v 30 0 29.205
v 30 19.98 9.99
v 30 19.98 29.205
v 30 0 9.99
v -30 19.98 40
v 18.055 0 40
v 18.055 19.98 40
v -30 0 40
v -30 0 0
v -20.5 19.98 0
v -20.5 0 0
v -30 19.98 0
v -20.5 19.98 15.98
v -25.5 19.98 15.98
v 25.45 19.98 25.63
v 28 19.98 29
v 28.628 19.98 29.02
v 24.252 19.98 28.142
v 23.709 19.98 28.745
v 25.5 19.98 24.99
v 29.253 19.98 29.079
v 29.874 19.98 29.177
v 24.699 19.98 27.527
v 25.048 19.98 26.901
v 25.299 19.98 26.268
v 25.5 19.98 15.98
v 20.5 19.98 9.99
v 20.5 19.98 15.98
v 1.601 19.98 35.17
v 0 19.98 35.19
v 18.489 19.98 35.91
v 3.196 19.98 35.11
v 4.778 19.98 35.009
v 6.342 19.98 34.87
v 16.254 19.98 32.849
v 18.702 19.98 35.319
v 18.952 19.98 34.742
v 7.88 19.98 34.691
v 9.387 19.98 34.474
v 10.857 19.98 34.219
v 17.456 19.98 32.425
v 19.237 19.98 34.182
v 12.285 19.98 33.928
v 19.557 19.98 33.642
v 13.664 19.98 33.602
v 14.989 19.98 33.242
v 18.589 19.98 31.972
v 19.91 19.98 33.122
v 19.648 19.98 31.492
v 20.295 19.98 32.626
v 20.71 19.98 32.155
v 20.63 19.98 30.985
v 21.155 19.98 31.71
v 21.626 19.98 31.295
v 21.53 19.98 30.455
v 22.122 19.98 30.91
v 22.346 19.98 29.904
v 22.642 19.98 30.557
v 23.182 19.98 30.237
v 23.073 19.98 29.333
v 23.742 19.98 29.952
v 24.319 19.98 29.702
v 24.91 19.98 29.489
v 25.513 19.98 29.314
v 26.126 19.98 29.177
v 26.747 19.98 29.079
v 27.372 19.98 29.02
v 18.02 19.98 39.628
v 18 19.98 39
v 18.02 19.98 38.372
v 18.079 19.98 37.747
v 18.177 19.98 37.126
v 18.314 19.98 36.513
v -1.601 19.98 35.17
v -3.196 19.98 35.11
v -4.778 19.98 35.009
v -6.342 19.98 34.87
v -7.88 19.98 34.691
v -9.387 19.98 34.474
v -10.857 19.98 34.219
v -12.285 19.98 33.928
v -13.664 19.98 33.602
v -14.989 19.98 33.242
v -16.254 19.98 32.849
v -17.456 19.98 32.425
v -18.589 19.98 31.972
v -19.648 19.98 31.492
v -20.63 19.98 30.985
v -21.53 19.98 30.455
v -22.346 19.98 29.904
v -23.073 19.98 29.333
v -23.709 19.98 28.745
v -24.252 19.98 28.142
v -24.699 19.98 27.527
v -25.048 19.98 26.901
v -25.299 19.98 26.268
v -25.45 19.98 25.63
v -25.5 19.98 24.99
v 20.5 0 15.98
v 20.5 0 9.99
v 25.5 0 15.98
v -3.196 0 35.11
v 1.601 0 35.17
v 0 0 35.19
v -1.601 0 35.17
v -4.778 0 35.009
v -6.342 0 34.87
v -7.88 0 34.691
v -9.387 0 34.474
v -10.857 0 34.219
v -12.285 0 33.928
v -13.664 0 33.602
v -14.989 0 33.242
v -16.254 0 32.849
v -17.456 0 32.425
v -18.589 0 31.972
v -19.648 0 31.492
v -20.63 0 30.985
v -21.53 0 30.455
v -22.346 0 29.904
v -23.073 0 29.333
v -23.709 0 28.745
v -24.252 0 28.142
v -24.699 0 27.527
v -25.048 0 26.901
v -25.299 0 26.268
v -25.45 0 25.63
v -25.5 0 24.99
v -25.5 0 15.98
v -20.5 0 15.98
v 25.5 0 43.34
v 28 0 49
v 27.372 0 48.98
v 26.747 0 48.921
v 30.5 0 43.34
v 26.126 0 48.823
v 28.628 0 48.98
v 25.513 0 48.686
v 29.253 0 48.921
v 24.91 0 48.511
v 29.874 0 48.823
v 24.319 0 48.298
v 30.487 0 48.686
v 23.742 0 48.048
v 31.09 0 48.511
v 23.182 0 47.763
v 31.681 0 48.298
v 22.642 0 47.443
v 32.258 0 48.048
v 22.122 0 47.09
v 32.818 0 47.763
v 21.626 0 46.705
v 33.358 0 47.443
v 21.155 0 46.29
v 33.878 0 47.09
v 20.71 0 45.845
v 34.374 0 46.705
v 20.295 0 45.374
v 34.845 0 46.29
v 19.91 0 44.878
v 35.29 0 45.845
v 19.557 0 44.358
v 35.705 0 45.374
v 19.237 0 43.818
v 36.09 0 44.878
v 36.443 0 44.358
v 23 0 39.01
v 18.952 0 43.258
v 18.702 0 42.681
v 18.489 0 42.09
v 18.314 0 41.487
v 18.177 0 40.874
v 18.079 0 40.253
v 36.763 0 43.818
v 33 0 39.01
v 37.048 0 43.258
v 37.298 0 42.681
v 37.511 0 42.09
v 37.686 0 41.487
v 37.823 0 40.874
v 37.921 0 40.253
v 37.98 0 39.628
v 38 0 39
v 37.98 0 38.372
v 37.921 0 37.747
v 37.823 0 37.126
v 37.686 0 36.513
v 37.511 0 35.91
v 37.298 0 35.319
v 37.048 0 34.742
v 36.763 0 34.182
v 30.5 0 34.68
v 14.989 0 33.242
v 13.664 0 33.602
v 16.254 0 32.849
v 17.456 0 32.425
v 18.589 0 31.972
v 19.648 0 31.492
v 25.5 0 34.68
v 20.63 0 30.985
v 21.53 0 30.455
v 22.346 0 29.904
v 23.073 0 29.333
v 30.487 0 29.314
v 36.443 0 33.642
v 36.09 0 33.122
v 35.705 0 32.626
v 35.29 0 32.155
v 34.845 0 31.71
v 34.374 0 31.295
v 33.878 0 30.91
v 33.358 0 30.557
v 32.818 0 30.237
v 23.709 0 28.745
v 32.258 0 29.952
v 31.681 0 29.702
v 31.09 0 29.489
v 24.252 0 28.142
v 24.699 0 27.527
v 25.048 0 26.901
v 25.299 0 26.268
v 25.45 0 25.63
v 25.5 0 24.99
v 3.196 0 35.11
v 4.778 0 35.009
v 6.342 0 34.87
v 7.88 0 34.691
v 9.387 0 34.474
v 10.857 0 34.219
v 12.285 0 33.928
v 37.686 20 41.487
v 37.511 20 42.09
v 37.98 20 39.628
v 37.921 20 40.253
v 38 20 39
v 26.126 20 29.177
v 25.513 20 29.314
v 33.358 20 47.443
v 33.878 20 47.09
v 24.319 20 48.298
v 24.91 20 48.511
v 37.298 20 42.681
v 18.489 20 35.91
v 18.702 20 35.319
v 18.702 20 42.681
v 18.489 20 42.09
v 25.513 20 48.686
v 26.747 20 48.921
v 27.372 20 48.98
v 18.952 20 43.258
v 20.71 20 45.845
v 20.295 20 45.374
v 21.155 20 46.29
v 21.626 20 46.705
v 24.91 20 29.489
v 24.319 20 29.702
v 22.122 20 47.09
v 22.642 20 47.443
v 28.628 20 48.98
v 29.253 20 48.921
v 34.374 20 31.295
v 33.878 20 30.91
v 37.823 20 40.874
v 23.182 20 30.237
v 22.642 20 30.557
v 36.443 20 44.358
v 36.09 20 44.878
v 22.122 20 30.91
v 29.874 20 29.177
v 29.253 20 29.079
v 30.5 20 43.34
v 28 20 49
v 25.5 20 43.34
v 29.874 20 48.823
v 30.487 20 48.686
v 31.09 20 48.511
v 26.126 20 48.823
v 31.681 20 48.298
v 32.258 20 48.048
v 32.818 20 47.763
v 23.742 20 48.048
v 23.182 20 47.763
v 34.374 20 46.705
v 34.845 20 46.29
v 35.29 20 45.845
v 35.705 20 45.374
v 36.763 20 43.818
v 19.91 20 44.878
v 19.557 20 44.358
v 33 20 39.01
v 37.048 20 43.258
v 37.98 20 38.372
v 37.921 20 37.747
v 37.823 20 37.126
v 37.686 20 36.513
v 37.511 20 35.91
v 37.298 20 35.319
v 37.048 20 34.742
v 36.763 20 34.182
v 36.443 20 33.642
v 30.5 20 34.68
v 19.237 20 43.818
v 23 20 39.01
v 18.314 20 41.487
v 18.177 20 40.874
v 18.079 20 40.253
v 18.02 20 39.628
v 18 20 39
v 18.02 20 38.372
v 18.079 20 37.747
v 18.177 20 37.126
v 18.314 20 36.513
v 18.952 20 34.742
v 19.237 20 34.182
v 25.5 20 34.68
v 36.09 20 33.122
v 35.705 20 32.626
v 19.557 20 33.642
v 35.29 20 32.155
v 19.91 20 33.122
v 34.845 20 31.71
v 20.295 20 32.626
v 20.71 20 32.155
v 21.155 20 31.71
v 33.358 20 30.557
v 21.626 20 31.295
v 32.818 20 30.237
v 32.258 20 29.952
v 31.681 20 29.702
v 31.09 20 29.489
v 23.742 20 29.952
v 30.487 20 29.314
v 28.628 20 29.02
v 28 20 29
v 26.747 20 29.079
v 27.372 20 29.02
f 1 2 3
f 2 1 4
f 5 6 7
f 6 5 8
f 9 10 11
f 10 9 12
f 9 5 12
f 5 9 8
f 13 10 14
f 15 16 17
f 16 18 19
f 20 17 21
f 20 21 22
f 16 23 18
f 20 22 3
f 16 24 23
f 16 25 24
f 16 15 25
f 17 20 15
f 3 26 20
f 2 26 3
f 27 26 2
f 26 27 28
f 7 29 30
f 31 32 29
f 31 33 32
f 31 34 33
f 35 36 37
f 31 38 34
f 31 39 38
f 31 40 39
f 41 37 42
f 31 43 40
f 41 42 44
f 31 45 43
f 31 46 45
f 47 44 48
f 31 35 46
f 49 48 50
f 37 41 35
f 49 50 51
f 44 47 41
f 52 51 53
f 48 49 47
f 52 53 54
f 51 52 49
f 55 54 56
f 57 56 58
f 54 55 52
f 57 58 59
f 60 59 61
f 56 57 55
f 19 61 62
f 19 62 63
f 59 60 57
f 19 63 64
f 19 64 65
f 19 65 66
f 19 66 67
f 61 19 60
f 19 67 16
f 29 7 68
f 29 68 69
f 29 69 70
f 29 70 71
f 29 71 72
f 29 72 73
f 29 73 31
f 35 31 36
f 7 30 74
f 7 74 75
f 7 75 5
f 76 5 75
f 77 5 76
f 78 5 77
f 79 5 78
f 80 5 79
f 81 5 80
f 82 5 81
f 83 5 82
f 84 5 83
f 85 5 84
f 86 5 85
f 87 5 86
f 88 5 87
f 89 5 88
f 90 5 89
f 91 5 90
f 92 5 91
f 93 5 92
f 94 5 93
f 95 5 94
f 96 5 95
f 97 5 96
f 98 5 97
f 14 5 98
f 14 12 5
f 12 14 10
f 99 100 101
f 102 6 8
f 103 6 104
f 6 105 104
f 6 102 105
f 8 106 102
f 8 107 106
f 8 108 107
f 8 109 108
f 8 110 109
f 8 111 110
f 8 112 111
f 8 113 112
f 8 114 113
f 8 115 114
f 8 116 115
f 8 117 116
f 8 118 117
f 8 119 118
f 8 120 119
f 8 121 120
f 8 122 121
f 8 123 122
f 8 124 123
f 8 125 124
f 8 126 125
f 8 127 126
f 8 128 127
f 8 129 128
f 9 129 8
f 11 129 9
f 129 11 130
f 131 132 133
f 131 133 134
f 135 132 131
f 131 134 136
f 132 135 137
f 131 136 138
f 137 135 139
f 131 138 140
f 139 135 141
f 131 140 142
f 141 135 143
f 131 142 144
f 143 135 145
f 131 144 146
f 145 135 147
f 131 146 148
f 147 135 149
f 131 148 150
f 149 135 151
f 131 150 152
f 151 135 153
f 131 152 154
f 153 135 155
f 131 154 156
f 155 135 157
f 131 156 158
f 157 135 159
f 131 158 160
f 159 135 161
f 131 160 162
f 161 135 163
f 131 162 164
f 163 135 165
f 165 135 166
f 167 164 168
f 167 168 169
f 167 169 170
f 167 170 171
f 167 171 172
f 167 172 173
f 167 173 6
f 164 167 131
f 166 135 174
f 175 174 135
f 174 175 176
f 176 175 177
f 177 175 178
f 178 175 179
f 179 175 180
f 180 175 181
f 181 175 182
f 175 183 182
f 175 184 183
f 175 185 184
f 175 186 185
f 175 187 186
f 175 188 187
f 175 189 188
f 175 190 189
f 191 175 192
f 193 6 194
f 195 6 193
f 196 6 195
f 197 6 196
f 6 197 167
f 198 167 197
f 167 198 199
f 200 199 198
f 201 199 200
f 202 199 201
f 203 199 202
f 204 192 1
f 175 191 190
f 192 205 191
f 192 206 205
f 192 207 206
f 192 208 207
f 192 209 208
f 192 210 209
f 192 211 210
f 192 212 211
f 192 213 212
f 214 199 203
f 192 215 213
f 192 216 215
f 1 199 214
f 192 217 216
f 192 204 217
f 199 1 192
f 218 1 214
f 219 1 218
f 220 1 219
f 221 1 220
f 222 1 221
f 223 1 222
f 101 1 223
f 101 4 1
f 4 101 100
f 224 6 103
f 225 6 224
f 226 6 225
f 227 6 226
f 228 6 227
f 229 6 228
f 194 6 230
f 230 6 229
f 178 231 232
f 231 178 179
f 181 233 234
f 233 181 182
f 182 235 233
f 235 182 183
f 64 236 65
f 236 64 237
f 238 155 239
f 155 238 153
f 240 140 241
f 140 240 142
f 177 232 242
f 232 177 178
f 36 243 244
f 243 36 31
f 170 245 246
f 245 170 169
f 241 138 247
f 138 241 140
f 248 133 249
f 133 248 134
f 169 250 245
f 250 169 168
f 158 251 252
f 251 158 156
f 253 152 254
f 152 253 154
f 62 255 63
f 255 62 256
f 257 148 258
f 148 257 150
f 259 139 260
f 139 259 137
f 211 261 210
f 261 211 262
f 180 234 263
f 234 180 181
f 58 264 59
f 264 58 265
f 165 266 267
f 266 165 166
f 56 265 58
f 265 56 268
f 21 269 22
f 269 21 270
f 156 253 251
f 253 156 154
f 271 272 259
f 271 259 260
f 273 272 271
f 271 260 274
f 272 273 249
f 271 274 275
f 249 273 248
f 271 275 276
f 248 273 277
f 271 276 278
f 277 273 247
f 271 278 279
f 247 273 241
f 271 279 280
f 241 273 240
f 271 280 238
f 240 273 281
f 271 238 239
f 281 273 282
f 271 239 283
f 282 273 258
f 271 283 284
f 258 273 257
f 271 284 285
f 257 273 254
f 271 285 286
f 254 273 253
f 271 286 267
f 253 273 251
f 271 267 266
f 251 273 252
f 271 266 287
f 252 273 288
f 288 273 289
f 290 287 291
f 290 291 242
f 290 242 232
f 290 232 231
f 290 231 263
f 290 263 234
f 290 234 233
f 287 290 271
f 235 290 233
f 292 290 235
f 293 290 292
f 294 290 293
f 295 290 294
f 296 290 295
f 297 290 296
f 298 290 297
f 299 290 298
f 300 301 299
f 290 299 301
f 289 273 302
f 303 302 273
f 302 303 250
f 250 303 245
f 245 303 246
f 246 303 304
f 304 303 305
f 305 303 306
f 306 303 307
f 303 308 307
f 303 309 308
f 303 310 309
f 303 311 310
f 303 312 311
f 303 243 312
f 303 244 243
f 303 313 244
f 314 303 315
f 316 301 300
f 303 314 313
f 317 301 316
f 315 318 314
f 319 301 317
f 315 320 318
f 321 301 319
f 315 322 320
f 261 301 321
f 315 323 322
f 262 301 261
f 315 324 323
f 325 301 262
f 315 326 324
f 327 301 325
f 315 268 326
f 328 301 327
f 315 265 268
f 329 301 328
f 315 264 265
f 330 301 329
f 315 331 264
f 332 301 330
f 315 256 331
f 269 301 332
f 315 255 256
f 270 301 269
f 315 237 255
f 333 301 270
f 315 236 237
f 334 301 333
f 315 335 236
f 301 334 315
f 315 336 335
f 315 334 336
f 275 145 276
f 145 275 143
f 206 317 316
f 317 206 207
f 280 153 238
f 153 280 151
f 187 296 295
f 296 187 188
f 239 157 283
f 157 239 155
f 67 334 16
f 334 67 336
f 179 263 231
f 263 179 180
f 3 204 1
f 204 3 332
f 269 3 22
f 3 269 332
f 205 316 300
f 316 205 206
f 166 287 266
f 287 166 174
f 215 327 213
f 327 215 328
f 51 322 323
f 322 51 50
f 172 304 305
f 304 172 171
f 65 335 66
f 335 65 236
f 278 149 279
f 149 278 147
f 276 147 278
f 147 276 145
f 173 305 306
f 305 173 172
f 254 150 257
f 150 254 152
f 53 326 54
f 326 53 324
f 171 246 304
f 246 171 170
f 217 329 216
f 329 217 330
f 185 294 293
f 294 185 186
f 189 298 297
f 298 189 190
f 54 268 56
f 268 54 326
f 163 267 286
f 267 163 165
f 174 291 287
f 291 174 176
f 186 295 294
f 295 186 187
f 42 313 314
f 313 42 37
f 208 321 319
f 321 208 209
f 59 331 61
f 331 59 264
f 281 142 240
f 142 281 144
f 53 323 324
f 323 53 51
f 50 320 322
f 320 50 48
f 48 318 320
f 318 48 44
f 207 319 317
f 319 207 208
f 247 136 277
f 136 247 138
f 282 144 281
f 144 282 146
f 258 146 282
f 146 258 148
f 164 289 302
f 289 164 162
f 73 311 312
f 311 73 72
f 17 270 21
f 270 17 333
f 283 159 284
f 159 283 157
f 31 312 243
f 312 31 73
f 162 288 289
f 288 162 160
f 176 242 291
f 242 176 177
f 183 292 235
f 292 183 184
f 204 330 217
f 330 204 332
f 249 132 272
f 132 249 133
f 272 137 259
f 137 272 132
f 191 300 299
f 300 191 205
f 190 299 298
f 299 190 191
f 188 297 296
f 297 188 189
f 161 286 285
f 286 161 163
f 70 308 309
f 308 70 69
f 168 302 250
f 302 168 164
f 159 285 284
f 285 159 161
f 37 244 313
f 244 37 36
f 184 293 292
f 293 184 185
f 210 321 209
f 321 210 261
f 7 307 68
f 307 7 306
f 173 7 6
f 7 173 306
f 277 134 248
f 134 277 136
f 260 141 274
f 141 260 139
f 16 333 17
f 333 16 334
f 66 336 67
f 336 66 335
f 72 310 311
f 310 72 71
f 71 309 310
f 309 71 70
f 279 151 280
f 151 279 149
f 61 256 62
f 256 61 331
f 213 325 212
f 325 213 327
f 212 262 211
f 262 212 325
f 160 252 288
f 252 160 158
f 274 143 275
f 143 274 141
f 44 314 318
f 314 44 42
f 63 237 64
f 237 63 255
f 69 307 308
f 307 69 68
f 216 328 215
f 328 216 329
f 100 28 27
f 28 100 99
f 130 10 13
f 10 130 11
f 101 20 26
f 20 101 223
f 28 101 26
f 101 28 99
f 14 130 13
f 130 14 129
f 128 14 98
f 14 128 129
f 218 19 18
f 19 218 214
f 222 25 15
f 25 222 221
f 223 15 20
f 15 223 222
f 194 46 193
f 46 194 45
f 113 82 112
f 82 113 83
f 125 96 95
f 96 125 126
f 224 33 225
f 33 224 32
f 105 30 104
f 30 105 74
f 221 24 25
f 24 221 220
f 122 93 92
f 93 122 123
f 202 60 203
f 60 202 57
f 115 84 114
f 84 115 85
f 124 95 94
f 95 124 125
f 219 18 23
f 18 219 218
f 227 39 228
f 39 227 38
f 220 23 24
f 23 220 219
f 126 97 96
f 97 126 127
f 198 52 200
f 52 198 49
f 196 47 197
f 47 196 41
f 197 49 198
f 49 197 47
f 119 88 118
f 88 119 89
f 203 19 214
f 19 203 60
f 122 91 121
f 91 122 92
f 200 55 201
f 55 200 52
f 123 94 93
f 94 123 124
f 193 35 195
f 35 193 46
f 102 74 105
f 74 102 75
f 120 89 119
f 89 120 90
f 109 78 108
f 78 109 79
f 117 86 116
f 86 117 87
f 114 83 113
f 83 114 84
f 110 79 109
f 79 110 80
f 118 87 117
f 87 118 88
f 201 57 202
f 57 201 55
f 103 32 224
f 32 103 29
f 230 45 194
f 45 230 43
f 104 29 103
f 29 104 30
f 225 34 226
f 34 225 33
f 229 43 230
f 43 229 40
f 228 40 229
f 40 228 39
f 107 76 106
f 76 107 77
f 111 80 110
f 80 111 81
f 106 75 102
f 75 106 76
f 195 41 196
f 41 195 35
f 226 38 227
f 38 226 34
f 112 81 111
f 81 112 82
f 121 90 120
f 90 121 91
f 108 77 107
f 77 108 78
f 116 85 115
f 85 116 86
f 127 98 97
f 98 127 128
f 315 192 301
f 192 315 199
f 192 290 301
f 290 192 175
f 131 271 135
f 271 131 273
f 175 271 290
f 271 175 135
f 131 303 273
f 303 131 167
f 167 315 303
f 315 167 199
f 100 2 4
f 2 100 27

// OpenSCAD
$fn=100;
DELTA=0.01;

module up(x)
{
    translate([0,0,x])children();
}

module down(x)
{
    translate([0,0,-x])children();
}

THICK=20;
module bar()
{
    translate([-51/2,0,0])
    {
        translate([5,0,0]) cube([41,THICK,16]);
        up(16-DELTA) cube([51,THICK,25-16+DELTA]);
    }
    difference()
    {
        translate([0,THICK,25]) scale([1,1,0.4]) rotate([90,0,0]) cylinder(r=25.5,h=THICK);
        translate([-110,-DELTA,-195-DELTA]) cube([220,THICK+2*DELTA,220]);
    }
}

module barclaw(){
    difference()
    {
        difference()
        {
            w=60;
            union()
            {
                translate([-w/2,0,0])  cube([w,THICK-DELTA*2,40]);
                translate([28,THICK,39])rotate([90,0,0]) cylinder(r=10,h=THICK);
            }
            translate([0,-DELTA,-DELTA]) bar();
        }
        translate([28,THICK,39+DELTA])rotate([90,0,0])
        {
            down(DELTA) cylinder(r=5,h=THICK+2*DELTA, $fn=6);
        }
        translate([15,-DELTA,-DELTA]) cube([20,20,10]);
    }
}

module hang()
{
    SIDE=5;
    cylinder(r=10,h=SIDE);
    up(SIDE)cylinder(r=5-0.28,h=THICK);
    difference()
    {
        translate([2,-20,0])
        cube([10,35,THICK+SIDE]);
        up(SIDE)cylinder(r=10.28,h=THICK+DELTA);
    }
    R0=40;
    if(0)
    {translate([R0+5,12,0])difference()
    {
        cylinder(r=R0,h=THICK+SIDE);
        down(DELTA)cylinder(r=R0-7,h=THICK+SIDE+DELTA*2);
        translate([-R0/2,-R0*2,-DELTA])rotate([0,0,15])cube([R0*2+DELTA*2,R0*2,THICK+SIDE+DELTA*2]);
        translate([20,7.4,-(THICK+SIDE)/2])difference()
        {
            cube([THICK+SIDE, THICK+SIDE, (THICK+SIDE)*2]);
            translate([0,(THICK+SIDE)+2,THICK+SIDE])rotate([0,90,0])cylinder(r=2*(THICK+SIDE)/3,h=THICK+SIDE);
        }
    }
    translate([R0*2+3,R0,(THICK+SIDE)/2])rotate([120,90,0])down(4)cylinder(r=3,h=14);
}  {
    up=1.2*360;
    translate([R0+6,16,0])for(x=[0:1:up])
    {
        v=6.4-(x/(up/6));
        dff=x/24;
        rotate([0,0,270-x])translate([0,(R0-(up-x))/9.6,(dff)/2])cylinder(r=v,h=(THICK+SIDE)-dff);
    }
}
}

barclaw();
//translate([28,5+DELTA+THICK,39+DELTA])rotate([90,0,0])
//hang();
